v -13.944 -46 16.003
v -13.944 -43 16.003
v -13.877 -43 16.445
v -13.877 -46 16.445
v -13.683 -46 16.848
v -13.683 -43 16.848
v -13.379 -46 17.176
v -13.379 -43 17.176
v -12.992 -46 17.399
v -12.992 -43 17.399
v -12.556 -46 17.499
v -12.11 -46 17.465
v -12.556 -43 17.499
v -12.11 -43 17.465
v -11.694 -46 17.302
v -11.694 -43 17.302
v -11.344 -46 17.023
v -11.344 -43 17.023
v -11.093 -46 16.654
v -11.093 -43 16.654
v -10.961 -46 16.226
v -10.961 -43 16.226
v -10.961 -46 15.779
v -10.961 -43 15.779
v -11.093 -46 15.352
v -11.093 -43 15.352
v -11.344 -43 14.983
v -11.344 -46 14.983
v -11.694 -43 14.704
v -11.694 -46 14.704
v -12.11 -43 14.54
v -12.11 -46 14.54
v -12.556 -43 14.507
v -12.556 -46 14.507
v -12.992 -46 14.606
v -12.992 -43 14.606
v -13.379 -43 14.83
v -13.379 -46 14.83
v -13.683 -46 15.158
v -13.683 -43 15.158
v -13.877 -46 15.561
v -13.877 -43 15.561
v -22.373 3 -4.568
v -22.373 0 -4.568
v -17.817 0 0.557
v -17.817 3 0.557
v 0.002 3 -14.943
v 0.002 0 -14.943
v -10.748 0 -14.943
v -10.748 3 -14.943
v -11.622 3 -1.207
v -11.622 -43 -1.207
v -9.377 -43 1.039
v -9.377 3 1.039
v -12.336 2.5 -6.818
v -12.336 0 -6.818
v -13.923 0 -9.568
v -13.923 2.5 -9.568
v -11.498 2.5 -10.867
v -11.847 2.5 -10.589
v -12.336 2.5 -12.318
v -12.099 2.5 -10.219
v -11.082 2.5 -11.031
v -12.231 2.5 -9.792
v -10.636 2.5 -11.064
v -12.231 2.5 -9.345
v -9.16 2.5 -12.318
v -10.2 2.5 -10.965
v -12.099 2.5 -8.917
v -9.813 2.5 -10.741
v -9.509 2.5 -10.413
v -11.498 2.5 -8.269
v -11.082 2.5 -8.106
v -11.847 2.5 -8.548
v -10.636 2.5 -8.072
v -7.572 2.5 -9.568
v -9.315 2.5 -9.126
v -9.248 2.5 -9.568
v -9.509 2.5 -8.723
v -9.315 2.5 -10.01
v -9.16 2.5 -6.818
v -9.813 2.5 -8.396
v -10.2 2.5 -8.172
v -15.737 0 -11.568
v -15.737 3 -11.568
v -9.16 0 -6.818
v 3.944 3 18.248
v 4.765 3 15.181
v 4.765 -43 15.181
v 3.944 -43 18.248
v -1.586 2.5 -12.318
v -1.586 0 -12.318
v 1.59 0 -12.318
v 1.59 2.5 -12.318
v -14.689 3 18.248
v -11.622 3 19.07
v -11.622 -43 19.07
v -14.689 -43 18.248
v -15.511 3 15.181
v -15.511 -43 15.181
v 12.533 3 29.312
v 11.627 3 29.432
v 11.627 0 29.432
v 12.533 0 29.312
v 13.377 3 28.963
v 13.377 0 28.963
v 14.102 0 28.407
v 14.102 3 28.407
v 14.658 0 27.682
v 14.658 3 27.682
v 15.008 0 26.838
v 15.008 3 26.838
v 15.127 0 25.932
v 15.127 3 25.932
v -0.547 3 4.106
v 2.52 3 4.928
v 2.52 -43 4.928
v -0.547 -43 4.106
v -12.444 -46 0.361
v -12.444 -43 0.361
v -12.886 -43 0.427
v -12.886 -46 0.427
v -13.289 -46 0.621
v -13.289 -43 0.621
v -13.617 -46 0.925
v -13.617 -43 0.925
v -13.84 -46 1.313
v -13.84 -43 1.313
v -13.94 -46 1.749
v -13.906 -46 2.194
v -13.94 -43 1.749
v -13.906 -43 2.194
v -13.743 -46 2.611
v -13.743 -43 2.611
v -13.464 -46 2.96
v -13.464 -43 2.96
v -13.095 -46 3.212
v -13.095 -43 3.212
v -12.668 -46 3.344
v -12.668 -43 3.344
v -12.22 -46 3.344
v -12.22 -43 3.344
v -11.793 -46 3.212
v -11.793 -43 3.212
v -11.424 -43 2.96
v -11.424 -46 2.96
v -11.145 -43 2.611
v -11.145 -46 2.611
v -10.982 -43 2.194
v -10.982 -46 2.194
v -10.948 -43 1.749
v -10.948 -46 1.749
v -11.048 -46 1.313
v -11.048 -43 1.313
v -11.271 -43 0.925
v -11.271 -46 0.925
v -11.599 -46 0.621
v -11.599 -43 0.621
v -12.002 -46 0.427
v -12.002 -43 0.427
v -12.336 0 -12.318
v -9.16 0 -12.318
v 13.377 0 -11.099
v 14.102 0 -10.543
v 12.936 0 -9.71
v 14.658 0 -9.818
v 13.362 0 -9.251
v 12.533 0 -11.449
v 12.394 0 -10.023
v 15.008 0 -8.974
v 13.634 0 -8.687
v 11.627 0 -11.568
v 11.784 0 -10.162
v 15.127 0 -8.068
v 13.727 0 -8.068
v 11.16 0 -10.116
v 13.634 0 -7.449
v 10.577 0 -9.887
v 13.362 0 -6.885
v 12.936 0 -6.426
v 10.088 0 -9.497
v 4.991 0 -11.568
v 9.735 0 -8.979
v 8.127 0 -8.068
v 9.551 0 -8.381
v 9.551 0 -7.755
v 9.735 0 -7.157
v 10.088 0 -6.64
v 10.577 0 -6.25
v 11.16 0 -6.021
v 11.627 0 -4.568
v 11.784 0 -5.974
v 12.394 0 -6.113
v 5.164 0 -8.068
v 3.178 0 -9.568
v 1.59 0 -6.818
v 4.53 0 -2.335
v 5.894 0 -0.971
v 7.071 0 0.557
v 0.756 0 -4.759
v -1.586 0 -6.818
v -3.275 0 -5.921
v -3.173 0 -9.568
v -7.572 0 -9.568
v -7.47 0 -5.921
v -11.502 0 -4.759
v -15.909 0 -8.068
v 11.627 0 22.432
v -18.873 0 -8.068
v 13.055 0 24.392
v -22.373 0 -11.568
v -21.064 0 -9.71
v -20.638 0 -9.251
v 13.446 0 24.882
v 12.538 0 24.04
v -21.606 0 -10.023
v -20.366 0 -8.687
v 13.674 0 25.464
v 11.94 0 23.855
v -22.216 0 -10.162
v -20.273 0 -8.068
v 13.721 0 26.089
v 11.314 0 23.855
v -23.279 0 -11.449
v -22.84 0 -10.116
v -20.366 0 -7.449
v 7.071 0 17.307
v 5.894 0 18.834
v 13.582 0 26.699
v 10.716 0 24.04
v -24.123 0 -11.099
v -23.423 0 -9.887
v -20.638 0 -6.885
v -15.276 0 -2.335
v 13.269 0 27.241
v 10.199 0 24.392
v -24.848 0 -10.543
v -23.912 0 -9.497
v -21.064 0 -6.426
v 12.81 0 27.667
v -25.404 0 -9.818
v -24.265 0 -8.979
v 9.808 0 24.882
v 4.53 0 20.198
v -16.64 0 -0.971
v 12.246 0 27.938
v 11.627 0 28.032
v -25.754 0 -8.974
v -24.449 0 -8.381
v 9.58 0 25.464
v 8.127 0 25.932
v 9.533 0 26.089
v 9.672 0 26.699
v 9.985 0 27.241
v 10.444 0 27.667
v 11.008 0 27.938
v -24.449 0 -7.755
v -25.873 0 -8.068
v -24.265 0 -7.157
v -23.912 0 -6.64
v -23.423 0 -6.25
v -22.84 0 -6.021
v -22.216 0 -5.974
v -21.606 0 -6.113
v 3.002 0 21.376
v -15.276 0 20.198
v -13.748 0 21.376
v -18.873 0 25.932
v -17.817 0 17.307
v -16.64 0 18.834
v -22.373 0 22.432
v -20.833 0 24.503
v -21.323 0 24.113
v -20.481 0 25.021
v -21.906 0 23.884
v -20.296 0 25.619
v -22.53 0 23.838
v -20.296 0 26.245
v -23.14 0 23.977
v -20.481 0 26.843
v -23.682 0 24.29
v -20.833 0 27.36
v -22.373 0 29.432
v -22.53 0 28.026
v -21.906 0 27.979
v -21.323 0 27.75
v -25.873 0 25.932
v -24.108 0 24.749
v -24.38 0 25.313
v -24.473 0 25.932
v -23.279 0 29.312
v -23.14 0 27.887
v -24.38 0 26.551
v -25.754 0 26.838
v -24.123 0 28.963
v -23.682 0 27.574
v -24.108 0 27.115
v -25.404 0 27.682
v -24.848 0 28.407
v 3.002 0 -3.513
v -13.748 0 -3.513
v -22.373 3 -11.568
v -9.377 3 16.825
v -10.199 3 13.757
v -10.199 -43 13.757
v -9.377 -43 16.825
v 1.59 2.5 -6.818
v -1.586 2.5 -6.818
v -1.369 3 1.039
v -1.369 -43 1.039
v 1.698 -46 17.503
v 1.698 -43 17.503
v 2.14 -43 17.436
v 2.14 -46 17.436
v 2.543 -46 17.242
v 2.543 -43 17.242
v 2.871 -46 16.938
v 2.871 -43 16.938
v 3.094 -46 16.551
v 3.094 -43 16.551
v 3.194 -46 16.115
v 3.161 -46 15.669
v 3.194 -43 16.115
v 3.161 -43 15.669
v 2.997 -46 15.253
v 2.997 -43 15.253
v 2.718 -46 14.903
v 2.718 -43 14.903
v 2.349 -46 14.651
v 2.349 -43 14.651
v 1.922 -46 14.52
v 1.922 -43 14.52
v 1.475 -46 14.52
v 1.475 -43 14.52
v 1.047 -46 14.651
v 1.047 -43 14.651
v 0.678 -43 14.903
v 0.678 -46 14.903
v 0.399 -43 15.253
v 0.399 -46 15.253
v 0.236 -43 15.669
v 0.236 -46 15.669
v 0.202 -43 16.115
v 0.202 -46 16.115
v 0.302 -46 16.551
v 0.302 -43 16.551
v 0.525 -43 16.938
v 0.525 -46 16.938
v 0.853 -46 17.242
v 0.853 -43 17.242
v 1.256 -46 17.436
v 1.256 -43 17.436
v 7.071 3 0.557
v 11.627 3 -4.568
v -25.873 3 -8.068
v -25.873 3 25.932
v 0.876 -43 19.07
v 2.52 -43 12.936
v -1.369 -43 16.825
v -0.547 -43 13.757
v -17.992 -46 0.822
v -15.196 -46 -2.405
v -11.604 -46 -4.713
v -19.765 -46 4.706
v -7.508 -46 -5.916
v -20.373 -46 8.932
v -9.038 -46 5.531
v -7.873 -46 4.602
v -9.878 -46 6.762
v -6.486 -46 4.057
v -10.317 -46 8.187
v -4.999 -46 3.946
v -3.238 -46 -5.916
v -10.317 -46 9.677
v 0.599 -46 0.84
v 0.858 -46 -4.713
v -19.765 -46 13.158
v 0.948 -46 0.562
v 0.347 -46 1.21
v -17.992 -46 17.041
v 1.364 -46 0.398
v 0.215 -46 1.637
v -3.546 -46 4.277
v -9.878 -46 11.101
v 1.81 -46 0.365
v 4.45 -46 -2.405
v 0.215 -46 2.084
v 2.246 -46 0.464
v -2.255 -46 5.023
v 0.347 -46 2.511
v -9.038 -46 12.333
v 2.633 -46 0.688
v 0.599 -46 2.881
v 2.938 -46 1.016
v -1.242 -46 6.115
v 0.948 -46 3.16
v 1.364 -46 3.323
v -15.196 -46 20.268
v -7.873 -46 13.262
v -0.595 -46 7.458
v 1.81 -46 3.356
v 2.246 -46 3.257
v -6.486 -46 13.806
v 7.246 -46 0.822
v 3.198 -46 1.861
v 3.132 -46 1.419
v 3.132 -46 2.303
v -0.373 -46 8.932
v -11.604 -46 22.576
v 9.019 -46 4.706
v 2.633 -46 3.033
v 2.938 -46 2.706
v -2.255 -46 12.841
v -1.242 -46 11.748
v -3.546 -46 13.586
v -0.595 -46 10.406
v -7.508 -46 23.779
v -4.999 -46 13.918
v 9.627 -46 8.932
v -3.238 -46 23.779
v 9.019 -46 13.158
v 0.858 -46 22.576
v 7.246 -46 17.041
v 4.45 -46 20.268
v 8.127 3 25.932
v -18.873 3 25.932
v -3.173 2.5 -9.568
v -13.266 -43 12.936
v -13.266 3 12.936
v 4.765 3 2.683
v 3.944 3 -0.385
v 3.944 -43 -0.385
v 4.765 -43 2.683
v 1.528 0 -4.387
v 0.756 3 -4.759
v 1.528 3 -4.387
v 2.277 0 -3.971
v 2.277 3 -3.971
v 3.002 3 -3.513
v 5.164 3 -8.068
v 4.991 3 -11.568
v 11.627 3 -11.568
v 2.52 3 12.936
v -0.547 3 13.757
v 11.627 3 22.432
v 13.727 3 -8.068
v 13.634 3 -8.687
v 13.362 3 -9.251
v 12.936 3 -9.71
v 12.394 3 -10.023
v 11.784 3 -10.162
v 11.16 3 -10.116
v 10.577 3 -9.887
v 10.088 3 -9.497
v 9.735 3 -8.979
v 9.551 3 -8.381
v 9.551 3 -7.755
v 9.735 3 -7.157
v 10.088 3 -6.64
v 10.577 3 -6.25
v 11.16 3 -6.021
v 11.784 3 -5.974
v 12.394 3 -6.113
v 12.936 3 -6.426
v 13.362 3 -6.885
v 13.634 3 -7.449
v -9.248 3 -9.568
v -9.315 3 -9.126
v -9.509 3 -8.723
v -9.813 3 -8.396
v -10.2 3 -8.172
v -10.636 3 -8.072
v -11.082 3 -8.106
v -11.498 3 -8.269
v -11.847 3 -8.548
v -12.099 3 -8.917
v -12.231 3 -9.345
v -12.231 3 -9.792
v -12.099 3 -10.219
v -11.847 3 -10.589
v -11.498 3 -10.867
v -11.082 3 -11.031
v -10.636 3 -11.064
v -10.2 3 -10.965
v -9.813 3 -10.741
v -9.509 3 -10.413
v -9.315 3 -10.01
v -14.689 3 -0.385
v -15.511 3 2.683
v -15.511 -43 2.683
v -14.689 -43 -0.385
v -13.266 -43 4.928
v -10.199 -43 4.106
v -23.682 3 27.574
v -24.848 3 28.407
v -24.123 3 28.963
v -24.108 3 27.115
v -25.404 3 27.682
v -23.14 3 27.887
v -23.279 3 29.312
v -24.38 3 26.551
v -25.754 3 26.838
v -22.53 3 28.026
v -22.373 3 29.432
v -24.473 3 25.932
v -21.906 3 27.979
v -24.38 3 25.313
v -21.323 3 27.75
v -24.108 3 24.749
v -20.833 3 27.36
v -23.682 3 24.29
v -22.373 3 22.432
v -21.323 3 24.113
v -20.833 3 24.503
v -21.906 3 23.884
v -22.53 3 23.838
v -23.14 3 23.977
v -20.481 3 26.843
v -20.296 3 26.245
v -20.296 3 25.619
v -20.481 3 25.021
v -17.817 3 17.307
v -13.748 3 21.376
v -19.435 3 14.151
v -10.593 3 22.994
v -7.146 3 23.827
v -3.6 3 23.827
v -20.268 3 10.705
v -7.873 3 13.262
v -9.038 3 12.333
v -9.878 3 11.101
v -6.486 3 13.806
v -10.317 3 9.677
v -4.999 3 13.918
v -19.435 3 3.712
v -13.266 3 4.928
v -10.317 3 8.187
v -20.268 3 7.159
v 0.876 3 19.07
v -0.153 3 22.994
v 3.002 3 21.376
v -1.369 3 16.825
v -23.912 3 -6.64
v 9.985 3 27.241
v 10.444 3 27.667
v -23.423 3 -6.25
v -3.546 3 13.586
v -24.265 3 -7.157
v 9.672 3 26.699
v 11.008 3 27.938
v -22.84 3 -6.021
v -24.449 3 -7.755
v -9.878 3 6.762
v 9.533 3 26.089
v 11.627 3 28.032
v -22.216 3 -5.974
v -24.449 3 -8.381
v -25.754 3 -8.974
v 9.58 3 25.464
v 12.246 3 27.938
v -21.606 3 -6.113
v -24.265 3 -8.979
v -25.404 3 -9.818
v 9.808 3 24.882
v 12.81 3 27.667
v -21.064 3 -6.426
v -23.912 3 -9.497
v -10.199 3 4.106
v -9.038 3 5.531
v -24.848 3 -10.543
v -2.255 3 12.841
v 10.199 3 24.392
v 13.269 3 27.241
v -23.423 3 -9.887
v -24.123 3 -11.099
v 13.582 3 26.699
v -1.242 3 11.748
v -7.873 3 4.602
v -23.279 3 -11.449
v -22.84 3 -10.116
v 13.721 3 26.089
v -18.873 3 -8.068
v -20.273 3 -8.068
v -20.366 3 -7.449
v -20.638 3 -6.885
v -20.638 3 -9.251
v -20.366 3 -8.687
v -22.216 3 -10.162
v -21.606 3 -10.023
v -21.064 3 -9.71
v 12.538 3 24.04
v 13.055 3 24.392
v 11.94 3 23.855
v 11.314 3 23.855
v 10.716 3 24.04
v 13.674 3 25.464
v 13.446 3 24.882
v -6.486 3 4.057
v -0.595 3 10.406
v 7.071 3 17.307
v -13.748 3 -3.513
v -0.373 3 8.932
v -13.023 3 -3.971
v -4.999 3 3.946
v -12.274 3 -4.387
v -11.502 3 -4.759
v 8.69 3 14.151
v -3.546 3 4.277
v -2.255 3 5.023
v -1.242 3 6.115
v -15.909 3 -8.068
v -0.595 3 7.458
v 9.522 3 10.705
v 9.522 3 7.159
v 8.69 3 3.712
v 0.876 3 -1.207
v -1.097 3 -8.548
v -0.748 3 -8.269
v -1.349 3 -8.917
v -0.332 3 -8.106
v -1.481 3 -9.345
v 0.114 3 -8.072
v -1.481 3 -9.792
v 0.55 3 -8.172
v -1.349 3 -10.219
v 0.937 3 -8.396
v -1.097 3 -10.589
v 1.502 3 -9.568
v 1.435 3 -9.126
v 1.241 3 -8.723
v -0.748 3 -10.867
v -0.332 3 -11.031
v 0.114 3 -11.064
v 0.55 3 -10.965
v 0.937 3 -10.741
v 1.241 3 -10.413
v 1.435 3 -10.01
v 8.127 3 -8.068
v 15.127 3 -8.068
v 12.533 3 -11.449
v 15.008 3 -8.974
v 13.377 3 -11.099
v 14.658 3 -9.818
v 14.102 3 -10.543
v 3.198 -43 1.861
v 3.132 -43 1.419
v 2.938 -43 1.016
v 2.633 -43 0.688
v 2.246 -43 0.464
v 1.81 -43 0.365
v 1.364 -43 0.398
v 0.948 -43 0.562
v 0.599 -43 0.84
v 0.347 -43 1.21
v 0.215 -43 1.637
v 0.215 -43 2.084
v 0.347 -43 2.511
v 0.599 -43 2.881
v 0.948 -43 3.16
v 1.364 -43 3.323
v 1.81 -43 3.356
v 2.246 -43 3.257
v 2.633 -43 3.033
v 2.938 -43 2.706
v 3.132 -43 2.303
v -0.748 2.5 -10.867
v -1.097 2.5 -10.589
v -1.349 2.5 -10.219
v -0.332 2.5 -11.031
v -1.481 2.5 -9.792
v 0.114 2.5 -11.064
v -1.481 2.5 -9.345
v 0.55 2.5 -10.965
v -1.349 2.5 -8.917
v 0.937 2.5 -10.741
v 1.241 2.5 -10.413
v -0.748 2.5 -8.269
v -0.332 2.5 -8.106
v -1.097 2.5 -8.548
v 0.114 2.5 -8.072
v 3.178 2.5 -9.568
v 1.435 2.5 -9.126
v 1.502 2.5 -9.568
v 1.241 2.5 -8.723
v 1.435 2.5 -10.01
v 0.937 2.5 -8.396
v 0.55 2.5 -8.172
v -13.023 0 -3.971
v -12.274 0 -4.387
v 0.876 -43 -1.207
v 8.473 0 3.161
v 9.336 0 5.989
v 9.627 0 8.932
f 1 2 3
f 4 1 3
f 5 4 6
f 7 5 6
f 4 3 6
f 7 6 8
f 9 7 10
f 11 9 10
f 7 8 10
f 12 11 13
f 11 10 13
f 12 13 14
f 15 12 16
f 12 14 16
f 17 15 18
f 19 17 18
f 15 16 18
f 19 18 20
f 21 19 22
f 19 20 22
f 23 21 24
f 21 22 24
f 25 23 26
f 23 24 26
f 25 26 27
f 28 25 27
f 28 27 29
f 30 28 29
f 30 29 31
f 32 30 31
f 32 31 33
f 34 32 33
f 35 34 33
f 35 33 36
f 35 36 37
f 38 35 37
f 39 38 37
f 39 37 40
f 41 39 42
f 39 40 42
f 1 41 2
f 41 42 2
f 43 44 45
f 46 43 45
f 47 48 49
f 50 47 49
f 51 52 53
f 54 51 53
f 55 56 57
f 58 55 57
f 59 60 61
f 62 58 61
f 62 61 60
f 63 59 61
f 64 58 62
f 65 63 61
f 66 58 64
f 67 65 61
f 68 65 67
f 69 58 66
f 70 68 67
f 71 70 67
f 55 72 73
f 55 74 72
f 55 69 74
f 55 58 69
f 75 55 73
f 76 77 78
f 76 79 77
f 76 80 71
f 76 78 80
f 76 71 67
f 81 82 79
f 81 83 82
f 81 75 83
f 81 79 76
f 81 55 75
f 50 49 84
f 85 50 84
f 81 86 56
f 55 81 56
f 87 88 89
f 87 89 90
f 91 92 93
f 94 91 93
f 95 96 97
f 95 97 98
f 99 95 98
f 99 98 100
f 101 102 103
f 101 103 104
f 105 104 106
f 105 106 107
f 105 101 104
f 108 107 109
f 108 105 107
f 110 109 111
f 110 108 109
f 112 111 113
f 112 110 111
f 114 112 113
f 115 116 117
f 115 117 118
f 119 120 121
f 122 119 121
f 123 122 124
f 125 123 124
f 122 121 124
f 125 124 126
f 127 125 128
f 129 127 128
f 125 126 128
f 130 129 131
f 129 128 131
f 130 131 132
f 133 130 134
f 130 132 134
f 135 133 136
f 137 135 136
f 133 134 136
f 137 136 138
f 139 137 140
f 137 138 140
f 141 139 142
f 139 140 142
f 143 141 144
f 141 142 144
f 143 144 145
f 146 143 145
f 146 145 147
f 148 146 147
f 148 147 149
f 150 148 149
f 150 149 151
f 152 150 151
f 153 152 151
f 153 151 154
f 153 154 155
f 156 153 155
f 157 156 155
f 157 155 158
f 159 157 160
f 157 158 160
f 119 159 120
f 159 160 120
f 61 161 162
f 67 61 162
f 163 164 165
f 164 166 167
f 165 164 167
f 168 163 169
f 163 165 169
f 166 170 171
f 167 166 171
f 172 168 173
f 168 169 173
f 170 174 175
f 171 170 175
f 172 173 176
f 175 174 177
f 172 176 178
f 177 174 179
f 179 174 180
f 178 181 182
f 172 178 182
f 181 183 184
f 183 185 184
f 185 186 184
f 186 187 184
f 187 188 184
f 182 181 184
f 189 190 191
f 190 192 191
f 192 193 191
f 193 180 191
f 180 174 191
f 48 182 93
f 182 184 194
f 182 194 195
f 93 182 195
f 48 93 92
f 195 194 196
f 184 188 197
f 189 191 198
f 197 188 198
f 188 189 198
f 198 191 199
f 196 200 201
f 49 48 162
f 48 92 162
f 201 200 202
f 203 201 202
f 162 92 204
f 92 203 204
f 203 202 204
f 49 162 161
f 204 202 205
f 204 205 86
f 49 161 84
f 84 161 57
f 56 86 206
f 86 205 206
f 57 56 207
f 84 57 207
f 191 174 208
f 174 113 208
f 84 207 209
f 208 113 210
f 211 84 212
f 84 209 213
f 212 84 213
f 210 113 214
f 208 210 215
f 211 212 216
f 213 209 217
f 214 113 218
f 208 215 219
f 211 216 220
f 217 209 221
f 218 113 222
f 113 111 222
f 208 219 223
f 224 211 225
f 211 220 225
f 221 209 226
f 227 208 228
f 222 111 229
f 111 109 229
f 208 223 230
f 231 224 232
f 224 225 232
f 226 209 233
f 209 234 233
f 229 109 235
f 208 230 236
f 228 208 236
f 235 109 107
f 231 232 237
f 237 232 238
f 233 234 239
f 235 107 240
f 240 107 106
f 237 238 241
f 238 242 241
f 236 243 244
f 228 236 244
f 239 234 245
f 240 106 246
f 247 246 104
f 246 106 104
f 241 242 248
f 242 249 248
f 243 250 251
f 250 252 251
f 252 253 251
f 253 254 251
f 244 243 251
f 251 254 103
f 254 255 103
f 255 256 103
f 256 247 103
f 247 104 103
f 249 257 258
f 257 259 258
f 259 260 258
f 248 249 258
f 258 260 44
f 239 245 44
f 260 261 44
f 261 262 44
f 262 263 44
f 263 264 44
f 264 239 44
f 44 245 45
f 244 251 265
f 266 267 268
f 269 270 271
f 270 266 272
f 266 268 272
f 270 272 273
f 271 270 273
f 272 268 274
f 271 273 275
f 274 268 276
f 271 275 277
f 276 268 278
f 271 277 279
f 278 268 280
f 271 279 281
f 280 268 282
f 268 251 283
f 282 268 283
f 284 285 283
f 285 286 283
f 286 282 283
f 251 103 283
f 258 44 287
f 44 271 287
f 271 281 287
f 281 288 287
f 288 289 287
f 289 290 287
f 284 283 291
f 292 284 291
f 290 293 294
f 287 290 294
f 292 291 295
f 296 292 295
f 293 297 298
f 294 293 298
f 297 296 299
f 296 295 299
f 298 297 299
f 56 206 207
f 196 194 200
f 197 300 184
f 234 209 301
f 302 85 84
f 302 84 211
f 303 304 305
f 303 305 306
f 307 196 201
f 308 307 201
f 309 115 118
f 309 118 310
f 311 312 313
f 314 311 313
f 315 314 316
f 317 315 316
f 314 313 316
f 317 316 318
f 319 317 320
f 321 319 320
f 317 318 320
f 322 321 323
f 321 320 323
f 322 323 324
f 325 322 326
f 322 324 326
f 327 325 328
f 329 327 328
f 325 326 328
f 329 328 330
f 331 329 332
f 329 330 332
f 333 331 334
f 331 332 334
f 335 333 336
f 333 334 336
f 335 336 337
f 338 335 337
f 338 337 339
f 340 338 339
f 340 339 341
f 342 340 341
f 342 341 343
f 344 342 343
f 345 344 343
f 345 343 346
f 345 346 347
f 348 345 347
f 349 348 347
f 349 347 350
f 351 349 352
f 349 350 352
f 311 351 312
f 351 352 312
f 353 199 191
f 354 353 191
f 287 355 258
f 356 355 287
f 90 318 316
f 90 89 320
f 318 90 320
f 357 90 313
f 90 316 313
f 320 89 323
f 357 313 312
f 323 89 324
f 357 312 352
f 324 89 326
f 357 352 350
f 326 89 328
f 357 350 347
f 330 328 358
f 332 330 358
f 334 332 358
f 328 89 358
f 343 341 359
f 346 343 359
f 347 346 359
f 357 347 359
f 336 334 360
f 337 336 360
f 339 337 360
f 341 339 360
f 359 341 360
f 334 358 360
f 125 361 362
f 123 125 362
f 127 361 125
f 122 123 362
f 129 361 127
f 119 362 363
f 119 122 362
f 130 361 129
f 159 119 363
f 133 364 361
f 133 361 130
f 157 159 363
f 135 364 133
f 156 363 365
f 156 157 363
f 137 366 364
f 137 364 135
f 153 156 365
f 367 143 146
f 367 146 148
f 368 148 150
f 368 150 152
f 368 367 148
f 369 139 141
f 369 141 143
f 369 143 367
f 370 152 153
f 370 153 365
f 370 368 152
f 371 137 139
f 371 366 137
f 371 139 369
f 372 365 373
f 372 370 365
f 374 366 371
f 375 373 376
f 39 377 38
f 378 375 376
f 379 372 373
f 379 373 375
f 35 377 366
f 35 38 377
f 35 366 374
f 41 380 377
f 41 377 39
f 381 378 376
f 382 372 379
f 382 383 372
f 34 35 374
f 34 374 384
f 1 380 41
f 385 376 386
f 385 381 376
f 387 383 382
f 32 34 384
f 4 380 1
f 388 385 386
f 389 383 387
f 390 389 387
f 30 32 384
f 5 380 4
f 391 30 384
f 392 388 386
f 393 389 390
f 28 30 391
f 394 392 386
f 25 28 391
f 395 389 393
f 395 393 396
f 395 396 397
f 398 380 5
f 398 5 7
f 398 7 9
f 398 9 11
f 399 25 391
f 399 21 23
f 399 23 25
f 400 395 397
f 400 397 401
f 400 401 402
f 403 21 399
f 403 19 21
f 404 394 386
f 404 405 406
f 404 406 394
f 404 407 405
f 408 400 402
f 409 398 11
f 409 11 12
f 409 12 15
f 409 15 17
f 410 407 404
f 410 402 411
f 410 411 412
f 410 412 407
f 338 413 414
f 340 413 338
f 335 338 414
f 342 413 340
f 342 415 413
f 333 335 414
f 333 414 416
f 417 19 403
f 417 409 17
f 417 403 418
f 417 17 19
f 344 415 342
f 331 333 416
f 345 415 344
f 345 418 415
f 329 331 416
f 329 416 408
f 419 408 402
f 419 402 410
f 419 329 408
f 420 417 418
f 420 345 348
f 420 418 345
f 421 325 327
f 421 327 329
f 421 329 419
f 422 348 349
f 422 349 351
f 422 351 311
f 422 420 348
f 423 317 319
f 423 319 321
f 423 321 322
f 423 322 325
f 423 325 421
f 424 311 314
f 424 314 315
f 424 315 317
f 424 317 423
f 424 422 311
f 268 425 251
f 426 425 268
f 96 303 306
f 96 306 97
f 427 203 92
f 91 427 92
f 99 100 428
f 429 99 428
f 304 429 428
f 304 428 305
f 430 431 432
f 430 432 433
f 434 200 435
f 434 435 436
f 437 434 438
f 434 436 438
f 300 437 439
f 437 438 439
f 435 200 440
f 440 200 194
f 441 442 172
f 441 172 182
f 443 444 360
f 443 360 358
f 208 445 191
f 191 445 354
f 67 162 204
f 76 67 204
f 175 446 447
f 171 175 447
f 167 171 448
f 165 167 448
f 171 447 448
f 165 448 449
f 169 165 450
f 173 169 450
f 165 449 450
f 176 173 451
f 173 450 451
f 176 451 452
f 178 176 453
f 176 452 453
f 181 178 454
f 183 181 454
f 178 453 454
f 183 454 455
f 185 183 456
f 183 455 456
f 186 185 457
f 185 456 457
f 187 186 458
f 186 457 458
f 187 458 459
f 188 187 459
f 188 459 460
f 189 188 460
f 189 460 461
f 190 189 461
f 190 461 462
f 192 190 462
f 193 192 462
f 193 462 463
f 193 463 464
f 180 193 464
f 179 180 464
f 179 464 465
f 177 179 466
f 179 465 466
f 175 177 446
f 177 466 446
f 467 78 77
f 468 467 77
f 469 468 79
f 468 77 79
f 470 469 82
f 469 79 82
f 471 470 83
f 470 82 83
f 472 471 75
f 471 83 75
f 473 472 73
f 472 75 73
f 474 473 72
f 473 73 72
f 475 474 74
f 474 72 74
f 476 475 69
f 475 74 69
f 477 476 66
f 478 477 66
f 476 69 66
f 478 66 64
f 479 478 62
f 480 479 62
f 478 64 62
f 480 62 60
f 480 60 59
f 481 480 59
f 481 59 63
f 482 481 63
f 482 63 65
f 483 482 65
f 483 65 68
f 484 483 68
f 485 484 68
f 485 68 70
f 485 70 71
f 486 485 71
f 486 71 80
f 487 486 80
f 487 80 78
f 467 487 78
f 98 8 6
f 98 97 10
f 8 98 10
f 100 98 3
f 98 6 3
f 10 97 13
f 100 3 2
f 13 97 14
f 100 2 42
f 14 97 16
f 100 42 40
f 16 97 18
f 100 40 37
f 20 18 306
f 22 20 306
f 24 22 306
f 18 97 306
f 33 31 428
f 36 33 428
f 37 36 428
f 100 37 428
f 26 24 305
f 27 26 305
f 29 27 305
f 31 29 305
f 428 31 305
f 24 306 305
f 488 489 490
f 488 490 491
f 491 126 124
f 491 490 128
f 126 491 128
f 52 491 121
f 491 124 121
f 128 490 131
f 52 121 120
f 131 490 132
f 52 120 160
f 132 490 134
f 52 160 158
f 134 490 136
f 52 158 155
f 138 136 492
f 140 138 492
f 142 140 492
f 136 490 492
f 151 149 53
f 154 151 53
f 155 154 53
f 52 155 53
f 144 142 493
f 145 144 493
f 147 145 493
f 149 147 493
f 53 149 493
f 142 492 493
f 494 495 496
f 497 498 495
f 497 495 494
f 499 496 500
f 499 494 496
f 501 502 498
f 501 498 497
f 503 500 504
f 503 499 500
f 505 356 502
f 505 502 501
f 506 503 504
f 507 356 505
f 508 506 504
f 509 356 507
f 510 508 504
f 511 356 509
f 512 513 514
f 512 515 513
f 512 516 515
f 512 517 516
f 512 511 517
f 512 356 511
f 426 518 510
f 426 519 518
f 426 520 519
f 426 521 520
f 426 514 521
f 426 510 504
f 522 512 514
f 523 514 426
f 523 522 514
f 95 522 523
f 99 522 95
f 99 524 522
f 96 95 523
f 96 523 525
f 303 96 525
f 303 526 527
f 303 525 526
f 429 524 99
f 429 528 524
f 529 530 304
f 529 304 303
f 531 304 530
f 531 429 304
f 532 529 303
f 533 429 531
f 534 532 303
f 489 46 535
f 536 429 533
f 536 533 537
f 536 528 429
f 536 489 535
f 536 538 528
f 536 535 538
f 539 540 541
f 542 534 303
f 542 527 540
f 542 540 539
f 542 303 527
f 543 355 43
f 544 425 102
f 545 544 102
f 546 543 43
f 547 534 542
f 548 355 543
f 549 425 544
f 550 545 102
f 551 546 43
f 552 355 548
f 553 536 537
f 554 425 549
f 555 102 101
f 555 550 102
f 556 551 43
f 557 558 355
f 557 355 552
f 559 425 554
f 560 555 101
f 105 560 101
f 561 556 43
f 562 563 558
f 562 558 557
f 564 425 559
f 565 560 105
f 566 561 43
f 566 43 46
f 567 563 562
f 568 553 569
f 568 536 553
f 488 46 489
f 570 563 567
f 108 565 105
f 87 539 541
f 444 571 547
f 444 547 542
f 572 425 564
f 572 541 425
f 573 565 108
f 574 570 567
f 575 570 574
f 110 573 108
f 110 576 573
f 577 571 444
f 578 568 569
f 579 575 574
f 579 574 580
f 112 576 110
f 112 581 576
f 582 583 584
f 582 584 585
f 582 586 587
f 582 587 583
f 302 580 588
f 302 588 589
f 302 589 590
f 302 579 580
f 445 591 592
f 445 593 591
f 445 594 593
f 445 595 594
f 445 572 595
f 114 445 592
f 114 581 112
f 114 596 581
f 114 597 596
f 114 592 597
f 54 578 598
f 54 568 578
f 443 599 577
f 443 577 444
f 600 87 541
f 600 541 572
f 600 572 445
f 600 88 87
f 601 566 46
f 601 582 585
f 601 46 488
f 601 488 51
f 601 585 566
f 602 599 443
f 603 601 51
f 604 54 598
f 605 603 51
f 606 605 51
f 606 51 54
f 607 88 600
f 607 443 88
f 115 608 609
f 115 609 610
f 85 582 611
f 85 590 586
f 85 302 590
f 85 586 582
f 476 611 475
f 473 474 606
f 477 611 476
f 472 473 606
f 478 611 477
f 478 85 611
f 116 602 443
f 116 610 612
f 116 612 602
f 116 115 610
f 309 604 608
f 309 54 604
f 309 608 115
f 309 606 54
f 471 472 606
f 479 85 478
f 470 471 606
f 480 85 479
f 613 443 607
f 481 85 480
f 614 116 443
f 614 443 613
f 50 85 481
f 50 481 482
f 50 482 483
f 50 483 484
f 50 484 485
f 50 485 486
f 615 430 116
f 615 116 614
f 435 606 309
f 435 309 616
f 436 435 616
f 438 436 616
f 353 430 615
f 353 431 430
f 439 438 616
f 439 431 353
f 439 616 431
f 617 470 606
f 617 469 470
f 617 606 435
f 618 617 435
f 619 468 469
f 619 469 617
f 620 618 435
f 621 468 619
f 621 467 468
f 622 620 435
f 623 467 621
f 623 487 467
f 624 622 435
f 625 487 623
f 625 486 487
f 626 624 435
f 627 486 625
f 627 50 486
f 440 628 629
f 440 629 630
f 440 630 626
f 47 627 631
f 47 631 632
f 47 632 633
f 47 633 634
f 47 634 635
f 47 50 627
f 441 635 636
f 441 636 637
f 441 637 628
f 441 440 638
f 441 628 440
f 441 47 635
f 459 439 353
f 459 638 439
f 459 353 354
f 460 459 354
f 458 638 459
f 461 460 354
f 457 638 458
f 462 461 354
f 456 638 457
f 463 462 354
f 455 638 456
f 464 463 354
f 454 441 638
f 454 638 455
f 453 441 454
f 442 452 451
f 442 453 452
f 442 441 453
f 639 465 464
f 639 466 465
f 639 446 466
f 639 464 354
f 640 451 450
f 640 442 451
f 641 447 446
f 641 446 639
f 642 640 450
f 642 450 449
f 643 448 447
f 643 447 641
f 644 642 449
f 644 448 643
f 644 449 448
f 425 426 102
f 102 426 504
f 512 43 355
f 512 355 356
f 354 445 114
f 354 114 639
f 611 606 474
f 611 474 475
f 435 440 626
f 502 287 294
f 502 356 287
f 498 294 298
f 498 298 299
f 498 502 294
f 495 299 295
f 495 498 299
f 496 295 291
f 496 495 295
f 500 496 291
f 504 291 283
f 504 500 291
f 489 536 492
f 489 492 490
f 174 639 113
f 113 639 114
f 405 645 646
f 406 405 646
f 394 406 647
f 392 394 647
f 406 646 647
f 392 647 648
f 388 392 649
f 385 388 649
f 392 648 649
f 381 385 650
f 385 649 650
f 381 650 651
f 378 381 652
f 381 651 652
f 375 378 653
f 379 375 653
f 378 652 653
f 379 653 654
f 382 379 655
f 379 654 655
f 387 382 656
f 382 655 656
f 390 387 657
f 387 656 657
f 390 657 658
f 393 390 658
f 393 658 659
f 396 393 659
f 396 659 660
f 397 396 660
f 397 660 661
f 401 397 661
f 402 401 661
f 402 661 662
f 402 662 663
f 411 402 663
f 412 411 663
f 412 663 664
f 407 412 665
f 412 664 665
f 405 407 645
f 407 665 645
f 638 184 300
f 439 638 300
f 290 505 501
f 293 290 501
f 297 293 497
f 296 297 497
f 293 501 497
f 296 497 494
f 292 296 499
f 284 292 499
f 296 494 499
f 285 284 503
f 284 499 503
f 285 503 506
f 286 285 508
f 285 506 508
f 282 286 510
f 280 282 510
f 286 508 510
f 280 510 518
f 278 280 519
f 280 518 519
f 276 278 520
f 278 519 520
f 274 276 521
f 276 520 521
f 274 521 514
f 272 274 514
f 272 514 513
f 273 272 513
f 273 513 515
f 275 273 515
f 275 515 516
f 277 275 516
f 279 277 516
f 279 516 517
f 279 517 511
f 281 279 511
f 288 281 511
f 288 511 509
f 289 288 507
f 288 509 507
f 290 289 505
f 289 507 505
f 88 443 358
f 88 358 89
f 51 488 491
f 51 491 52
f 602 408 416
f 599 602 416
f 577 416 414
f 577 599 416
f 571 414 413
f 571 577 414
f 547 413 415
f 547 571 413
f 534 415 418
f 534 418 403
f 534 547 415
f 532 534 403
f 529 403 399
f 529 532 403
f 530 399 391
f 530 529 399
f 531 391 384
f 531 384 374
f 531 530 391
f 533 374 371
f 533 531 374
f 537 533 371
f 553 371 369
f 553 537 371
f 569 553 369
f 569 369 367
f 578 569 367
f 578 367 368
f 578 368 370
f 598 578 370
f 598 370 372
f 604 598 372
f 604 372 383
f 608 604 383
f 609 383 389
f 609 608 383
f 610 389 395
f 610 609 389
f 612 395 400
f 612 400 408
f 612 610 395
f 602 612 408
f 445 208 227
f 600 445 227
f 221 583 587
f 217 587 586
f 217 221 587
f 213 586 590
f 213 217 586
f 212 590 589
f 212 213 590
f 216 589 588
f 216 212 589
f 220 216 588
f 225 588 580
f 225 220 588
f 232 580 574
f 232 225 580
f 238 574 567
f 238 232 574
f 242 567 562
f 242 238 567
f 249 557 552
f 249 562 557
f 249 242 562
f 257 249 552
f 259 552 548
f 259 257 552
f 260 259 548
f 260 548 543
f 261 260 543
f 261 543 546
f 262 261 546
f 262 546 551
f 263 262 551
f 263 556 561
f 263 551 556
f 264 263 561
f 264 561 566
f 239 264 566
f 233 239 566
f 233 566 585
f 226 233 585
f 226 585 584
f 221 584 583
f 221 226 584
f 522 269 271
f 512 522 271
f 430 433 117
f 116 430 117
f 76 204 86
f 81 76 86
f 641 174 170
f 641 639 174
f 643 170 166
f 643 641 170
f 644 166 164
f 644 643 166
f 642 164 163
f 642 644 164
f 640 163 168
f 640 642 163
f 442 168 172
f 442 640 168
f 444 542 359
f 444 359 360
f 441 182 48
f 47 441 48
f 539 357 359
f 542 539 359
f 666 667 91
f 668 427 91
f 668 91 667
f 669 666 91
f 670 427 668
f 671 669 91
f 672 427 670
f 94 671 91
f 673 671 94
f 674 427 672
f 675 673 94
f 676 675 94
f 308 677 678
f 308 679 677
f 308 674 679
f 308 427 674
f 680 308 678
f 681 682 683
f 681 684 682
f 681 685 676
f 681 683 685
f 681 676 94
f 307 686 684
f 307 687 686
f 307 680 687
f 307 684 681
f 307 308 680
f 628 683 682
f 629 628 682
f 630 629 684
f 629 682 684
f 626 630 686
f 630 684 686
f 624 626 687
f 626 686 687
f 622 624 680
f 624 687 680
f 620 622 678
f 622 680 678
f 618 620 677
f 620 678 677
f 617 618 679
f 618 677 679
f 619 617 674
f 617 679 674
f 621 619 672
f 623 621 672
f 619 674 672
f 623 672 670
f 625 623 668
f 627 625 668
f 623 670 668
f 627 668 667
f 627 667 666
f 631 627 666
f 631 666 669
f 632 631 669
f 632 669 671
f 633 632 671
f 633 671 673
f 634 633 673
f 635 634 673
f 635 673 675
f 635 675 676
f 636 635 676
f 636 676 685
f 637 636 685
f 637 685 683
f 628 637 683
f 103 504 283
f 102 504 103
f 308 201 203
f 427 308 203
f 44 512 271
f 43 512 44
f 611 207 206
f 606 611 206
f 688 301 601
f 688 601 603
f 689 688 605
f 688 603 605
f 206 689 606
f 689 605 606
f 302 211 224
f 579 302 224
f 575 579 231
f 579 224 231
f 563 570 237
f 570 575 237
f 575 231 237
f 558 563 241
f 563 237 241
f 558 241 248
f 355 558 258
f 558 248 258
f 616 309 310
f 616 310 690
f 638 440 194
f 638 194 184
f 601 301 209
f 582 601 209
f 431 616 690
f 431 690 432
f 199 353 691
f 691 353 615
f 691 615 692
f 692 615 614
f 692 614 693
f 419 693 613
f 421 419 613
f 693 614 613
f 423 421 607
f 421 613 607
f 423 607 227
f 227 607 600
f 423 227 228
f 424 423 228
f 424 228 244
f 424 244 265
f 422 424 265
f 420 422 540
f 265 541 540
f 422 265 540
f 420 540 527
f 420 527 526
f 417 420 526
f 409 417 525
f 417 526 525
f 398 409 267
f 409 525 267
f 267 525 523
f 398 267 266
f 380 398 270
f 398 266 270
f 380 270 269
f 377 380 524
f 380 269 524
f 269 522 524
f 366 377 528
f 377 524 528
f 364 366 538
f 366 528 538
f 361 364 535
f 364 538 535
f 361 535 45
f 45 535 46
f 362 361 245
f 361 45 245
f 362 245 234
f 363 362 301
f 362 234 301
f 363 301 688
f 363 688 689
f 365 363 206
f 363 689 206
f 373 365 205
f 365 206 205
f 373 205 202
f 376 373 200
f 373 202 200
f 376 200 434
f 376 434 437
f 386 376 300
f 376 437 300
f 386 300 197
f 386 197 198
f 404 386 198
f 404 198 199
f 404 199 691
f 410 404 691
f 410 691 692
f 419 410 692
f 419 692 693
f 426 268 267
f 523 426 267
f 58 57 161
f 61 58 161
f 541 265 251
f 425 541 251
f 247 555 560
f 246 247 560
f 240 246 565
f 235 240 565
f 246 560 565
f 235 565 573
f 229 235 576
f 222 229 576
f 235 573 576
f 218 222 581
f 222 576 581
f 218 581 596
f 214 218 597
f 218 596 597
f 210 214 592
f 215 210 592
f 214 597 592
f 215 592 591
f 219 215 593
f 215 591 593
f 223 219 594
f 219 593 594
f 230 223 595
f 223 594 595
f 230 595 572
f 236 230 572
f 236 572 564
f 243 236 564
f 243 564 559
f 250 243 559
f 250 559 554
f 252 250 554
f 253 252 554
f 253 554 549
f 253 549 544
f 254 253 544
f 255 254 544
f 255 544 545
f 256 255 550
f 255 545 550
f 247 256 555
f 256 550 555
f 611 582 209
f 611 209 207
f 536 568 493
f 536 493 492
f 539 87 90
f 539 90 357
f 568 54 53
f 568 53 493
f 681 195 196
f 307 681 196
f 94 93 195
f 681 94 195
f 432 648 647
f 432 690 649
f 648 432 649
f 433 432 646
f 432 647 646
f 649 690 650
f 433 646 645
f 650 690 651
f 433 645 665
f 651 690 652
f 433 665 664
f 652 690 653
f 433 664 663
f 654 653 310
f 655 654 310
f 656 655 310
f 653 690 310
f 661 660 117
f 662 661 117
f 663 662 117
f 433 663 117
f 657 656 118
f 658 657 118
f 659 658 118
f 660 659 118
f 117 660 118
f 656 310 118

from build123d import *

# Parameters (mm, degrees)
SKETCH_1_R               = 15
SKETCH_1_R_2             = 5
EXTRUDE_4_DEPTH          = 3
SKETCH_1_R_3             = 3.5
SKETCH_1_R_4             = 2.1
EXTRUDE_4_2_DEPTH        = 3
EXTRUDE_5_DEPTH          = 3
PATTERN_CIRCULAR_2_COUNT = 4
SKETCH_6_R               = 3.5
SKETCH_6_R_2             = 2.1
EXTRUDE_6_DEPTH          = 3
PATTERN_CIRCULAR_3_COUNT = 4
SKETCH_7_R               = 15
SKETCH_7_R_2             = 5
EXTRUDE_7_DEPTH          = 46
CUT_EXTRUDE_1_DEPTH      = 46
PATTERN_CIRCULAR_4_COUNT = 4
SKETCH_11_R              = 1.5
CUT_EXTRUDE_2_DEPTH      = 3
PATTERN_CIRCULAR_5_COUNT = 4
EXTRUDE_8_DEPTH          = 3
EXTRUDE_9_DEPTH          = 3
EXTRUDE_10_DEPTH         = 3
EXTRUDE_11_DEPTH         = 3
EXTRUDE_13_DEPTH         = 3
EXTRUDE_14_DEPTH         = 3
CUT_EXTRUDE_3_DEPTH      = 2.5
SKETCH_19_R              = 1.5
CUT_EXTRUDE_4_DEPTH      = 2.5
SKETCH_20_R              = 1.5
CUT_EXTRUDE_5_DEPTH      = 2.5
SKETCH_21_R              = 15
SKETCH_21_R_2            = 5
EXTRUDE_15_DEPTH         = 3
SKETCH_22_R              = 1.5
CUT_EXTRUDE_6_DEPTH      = 3
PATTERN_CIRCULAR_6_COUNT = 4
EXTRUDE_16_DEPTH         = 3
CUT_EXTRUDE_7_DEPTH      = 3
SKETCH_25_R              = 15
SKETCH_25_R_2            = 5
EXTRUDE_17_DEPTH         = 43
SKETCH_27_R              = 1.5
CUT_EXTRUDE_8_DEPTH      = 46
SKETCH_28_R              = 2.75
CUT_EXTRUDE_9_DEPTH      = 43
SKETCH_29_R              = 1.5
CUT_EXTRUDE_10_DEPTH     = 46
PATTERN_CIRCULAR_7_COUNT = 4
CUT_EXTRUDE_11_DEPTH     = 43
PATTERN_CIRCULAR_8_COUNT = 4
SKETCH_31_R              = 26.244176336
CUT_EXTRUDE_12_DEPTH     = 100


with BuildPart() as part:
    # 草图1 → 凸台-拉伸4 (new body)
    with BuildSketch(Plane(origin=(0, 0, 0), x_dir=(1, 0, 0), z_dir=(0, 1, 0))):
        with Locations((-5.372895461, -8.931727747)):
            Circle(SKETCH_1_R)
        with Locations((-5.372895461, -8.931727747)):
            Circle(SKETCH_1_R_2, mode=Mode.SUBTRACT)
    extrude(amount=EXTRUDE_4_DEPTH)



with BuildPart() as body_2:
    # 草图1 → Extrude 4 2 (new body)
    with BuildSketch(Plane(origin=(0, 0, 0), x_dir=(1, 0, 0), z_dir=(0, 1, 0))):
        with Locations((-22.372895461, 8.068272253)):
            Circle(SKETCH_1_R_3)
        with Locations((-22.372895461, 8.068272253)):
            Circle(SKETCH_1_R_4, mode=Mode.SUBTRACT)
    extrude(amount=EXTRUDE_4_2_DEPTH)


with BuildPart() as part_1:
    add(part.part)

    add(body_2.part)  # 凸台-拉伸5 merges body 2
    # 草图5 → 凸台-拉伸5 (add)
    with BuildSketch(Plane(origin=(0, 0, 0), x_dir=(1, 0, 0), z_dir=(0, 1, 0))):
        Polygon((-22.372895461, 4.568272253), (-10.372895461, -8.931727747), (-10.372895461, -3.931727747), (-5.372895461, -3.931727747), (-18.872895461, 8.068272253), align=None)
    extrude_5 = extrude(amount=EXTRUDE_5_DEPTH)

    # 阵列(圆周)2: 凸台-拉伸5 ×4 about axis
    pattern_circular_2_axis = Axis((-5.372895461, 0, 8.931727747), (0, 1, 0))
    for i in range(1, PATTERN_CIRCULAR_2_COUNT):
        add(extrude_5.rotate(pattern_circular_2_axis, i * 360 / PATTERN_CIRCULAR_2_COUNT))

    # 草图6 → 凸台-拉伸6 (add)
    with BuildSketch(Plane(origin=(0, 3, 0), x_dir=(1, 0, 0), z_dir=(0, 1, 0))):
        with Locations((11.627104539, 8.068272253)):
            Circle(SKETCH_6_R)
        with Locations((11.627104539, 8.068272253)):
            Circle(SKETCH_6_R_2, mode=Mode.SUBTRACT)
    extrude_6 = extrude(amount=-EXTRUDE_6_DEPTH)

    # 阵列(圆周)3: 凸台-拉伸6 ×4 about axis
    pattern_circular_3_axis = Axis((-5.372895461, 0, 8.931727747), (0, 1, 0))
    for i in range(1, PATTERN_CIRCULAR_3_COUNT):
        add(extrude_6.rotate(pattern_circular_3_axis, i * 360 / PATTERN_CIRCULAR_3_COUNT))

    # 草图7 → 凸台-拉伸7 (add)
    with BuildSketch(Plane.XZ):
        with Locations((-5.372895461, 8.931727747)):
            Circle(SKETCH_7_R)
        with Locations((-5.372895461, 8.931727747)):
            Circle(SKETCH_7_R_2, mode=Mode.SUBTRACT)
    extrude(amount=EXTRUDE_7_DEPTH)

    # 草图9 → 切除-拉伸1 (cut)
    with BuildSketch(Plane(origin=(0, 3, 0), x_dir=(1, 0, 0), z_dir=(0, 1, 0))):
        Polygon((0.876311502, -19.070022006), (-1.369054096, -16.824656408), (-0.547193246, -13.757429961), (2.520033201, -12.935569112), (4.765398798, -15.180934709), (3.943537949, -18.248161156), align=None)
    cut_extrude_1 = extrude(amount=-CUT_EXTRUDE_1_DEPTH, mode=Mode.SUBTRACT)

    # 阵列(圆周)4: 切除-拉伸1 ×4 about axis
    pattern_circular_4_axis = Axis((-5.372895461, 0, 8.931727747), (0, 1, 0))
    for i in range(1, PATTERN_CIRCULAR_4_COUNT):
        add(cut_extrude_1.rotate(pattern_circular_4_axis, i * 360 / PATTERN_CIRCULAR_4_COUNT), mode=Mode.SUBTRACT)

    # 草图11 → 切除-拉伸2 (cut)
    with BuildSketch(Plane(origin=(0, -43, 0), x_dir=(1, 0, 0), z_dir=(0, 1, 0))):
        with Locations((1.698172351, -1.860659935)):
            Circle(SKETCH_11_R)
    cut_extrude_2 = extrude(amount=-CUT_EXTRUDE_2_DEPTH, mode=Mode.SUBTRACT)

    # 阵列(圆周)5: 切除-拉伸2 ×4 about axis
    pattern_circular_5_axis = Axis((-5.372895461, 0, 8.931727747), (0, 1, 0))
    for i in range(1, PATTERN_CIRCULAR_5_COUNT):
        add(cut_extrude_2.rotate(pattern_circular_5_axis, i * 360 / PATTERN_CIRCULAR_5_COUNT), mode=Mode.SUBTRACT)

    # 草图12 → 凸台-拉伸8 (add)
    with BuildSketch(Plane(origin=(0, 3, 0), x_dir=(1, 0, 0), z_dir=(0, 1, 0))):
        Polygon((15.127104539, 8.068272253), (15.127104539, -25.931727747), (11.627104539, -22.431727747), (11.627104539, 4.568272253), align=None)
    extrude(amount=-EXTRUDE_8_DEPTH)

    # 草图13 → 凸台-拉伸9 (add)
    with BuildSketch(Plane(origin=(0, 3, 0), x_dir=(1, 0, 0), z_dir=(0, 1, 0))):
        Polygon((11.627104539, 11.568272253), (-22.372895461, 11.568272253), (-18.872895461, 8.068272253), (8.127104539, 8.068272253), align=None)
    extrude(amount=-EXTRUDE_9_DEPTH)

    # 草图14 → 凸台-拉伸10 (add)
    with BuildSketch(Plane(origin=(0, 3, 0), x_dir=(1, 0, 0), z_dir=(0, 1, 0))):
        Polygon((-25.872895461, 8.068272253), (-25.872895461, -25.931727747), (-22.372895461, -22.431727747), (-22.372895461, 4.568272253), align=None)
    extrude(amount=-EXTRUDE_10_DEPTH)

    # 草图15 → 凸台-拉伸11 (add)
    with BuildSketch(Plane(origin=(0, 3, 0), x_dir=(1, 0, 0), z_dir=(0, 1, 0))):
        Polygon((-22.372895461, -29.431727747), (11.627104539, -29.431727747), (8.127104539, -25.931727747), (-18.872895461, -25.931727747), align=None)
    extrude(amount=-EXTRUDE_11_DEPTH)

    # 草图16 → 凸台-拉伸13 (add)
    with BuildSketch(Plane.XZ):
        Polygon((-10.747895461, -4.193272253), (0.002104539, -4.193272253), (5.163560245, -8.068272253), (4.99115505, -11.568272253), (0.002104539, -14.943272253), (-10.747895461, -14.943272253), (-15.736945971, -11.568272253), (-15.909351166, -8.068272253), align=None)
        Polygon((-7.57246898, -9.568272253), (-9.16018222, -6.818272253), (-12.335608701, -6.818272253), (-13.923321941, -9.568272253), (-12.335608701, -12.318272253), (-9.16018222, -12.318272253), align=None, mode=Mode.SUBTRACT)
        Polygon((3.17753102, -9.568272253), (1.58981778, -6.818272253), (-1.585608701, -6.818272253), (-3.173321941, -9.568272253), (-1.585608701, -12.318272253), (1.58981778, -12.318272253), align=None, mode=Mode.SUBTRACT)
    extrude(amount=-EXTRUDE_13_DEPTH)

    # 草图18 → 凸台-拉伸14 (add)
    with BuildSketch(Plane.XZ):
        Polygon((-7.57246898, -9.568272253), (-9.16018222, -6.818272253), (-12.335608701, -6.818272253), (-13.923321941, -9.568272253), (-12.335608701, -12.318272253), (-9.16018222, -12.318272253), align=None)
        Polygon((3.17753102, -9.568272253), (1.58981778, -6.818272253), (-1.585608701, -6.818272253), (-3.173321941, -9.568272253), (-1.585608701, -12.318272253), (1.58981778, -12.318272253), align=None)
    extrude(amount=-EXTRUDE_14_DEPTH)

    # 草图17 → 切除-拉伸3 (cut)
    with BuildSketch(Plane.XZ):
        Polygon((-7.57246898, -9.568272253), (-9.16018222, -6.818272253), (-12.335608701, -6.818272253), (-13.923321941, -9.568272253), (-12.335608701, -12.318272253), (-9.16018222, -12.318272253), align=None)
        Polygon((3.17753102, -9.568272253), (1.58981778, -6.818272253), (-1.585608701, -6.818272253), (-3.173321941, -9.568272253), (-1.585608701, -12.318272253), (1.58981778, -12.318272253), align=None)
    extrude(amount=-CUT_EXTRUDE_3_DEPTH, mode=Mode.SUBTRACT)

    # 草图19 → 切除-拉伸4 (cut)
    with BuildSketch(Plane.XZ.offset(-2.5)):
        with Locations((0.002104539, -9.568272253)):
            Circle(SKETCH_19_R)
    extrude(amount=-CUT_EXTRUDE_4_DEPTH, mode=Mode.SUBTRACT)

    # 草图20 → 切除-拉伸5 (cut)
    with BuildSketch(Plane.XZ.offset(-2.5)):
        with Locations((-10.747895461, -9.568272253)):
            Circle(SKETCH_20_R)
    extrude(amount=-CUT_EXTRUDE_5_DEPTH, mode=Mode.SUBTRACT)

    # 草图8 → 凸台-拉伸16 (add)
    with BuildSketch(Plane.XZ.offset(46)):
        Polygon((3.943537949, 18.248161156), (0.876311502, 19.070022006), (-1.369054096, 16.824656408), (-0.547193246, 13.757429961), (2.520033201, 12.935569112), (4.765398798, 15.180934709), align=None)
    extrude(amount=EXTRUDE_16_DEPTH)

    # 草图24 → 切除-拉伸7 (cut)
    with BuildSketch(Plane.XZ.offset(49)):
        Polygon((4.765398798, 15.180934709), (3.943537949, 18.248161156), (0.876311502, 19.070022006), (-1.369054096, 16.824656408), (-0.547193246, 13.757429961), (2.520033201, 12.935569112), align=None)
    extrude(amount=-CUT_EXTRUDE_7_DEPTH, mode=Mode.SUBTRACT)


with BuildPart() as body_2_2:
    # 草图21 → 凸台-拉伸15 (new body)
    with BuildSketch(Plane(origin=(0, 0, 0), x_dir=(1, 0, 0), z_dir=(0, 1, 0))):
        with Locations((59.665545214, -8.931727747)):
            Circle(SKETCH_21_R)
        with Locations((59.665545214, -8.931727747)):
            Circle(SKETCH_21_R_2, mode=Mode.SUBTRACT)
    extrude(amount=EXTRUDE_15_DEPTH)

    # 草图22 → 切除-拉伸6 (cut)
    with BuildSketch(Plane.XZ):
        with Locations((59.665545214, 18.931727747)):
            Circle(SKETCH_22_R)
    cut_extrude_6 = extrude(amount=-CUT_EXTRUDE_6_DEPTH, mode=Mode.SUBTRACT)

    # 阵列(圆周)6: 切除-拉伸6 ×4 about axis
    pattern_circular_6_axis = Axis((59.665545214, 0, 8.931727747), (0, 1, 0))
    for i in range(1, PATTERN_CIRCULAR_6_COUNT):
        add(cut_extrude_6.rotate(pattern_circular_6_axis, i * 360 / PATTERN_CIRCULAR_6_COUNT), mode=Mode.SUBTRACT)

    # 草图25 → 凸台-拉伸17 (add)
    with BuildSketch(Plane.XZ):
        with Locations((59.665545214, 8.931727747)):
            Circle(SKETCH_25_R)
        with Locations((59.665545214, 8.931727747)):
            Circle(SKETCH_25_R_2, mode=Mode.SUBTRACT)
    extrude(amount=EXTRUDE_17_DEPTH)

    # 草图27 → 切除-拉伸8 (cut)
    with BuildSketch(Plane(origin=(0, 3, 0), x_dir=(1, 0, 0), z_dir=(0, 1, 0))):
        with Locations((59.665545214, 1.068272253)):
            Circle(SKETCH_27_R)
        with Locations((69.665545214, -8.931727747)):
            Circle(SKETCH_27_R)
        with Locations((59.665545214, -18.931727747)):
            Circle(SKETCH_27_R)
        with Locations((49.665545214, -8.931727747)):
            Circle(SKETCH_27_R)
    extrude(amount=-CUT_EXTRUDE_8_DEPTH, mode=Mode.SUBTRACT)

    # 草图28 → 切除-拉伸9 (cut)
    with BuildSketch(Plane.XZ.offset(43)):
        with Locations((59.665545214, 18.931727747)):
            Circle(SKETCH_28_R)
        with Locations((49.665545214, 8.931727747)):
            Circle(SKETCH_28_R)
        with Locations((59.665545214, -1.068272253)):
            Circle(SKETCH_28_R)
        with Locations((69.665545214, 8.931727747)):
            Circle(SKETCH_28_R)
    extrude(amount=-CUT_EXTRUDE_9_DEPTH, mode=Mode.SUBTRACT)

    # 草图29 → 切除-拉伸10 (cut)
    with BuildSketch(Plane(origin=(0, 3, 0), x_dir=(1, 0, 0), z_dir=(0, 1, 0))):
        with Locations((66.736613026, -1.860659935)):
            Circle(SKETCH_29_R)
    cut_extrude_10 = extrude(amount=-CUT_EXTRUDE_10_DEPTH, mode=Mode.SUBTRACT)

    # 阵列(圆周)7: 切除-拉伸10 ×4 about axis
    pattern_circular_7_axis = Axis((59.665545214, 0, 8.931727747), (0, 1, 0))
    for i in range(1, PATTERN_CIRCULAR_7_COUNT):
        add(cut_extrude_10.rotate(pattern_circular_7_axis, i * 360 / PATTERN_CIRCULAR_7_COUNT), mode=Mode.SUBTRACT)

    # 草图30 → 切除-拉伸11 (cut)
    with BuildSketch(Plane(origin=(0, 3, 0), x_dir=(1, 0, 0), z_dir=(0, 1, 0))):
        Polygon((64.491247429, -4.106025533), (67.558473876, -4.927886382), (69.803839473, -2.682520785), (68.981978624, 0.384705662), (65.914752177, 1.206566512), (63.669386579, -1.038799086), align=None)
    cut_extrude_11 = extrude(amount=-CUT_EXTRUDE_11_DEPTH, mode=Mode.SUBTRACT)

    # 阵列(圆周)8: 切除-拉伸11 ×4 about axis
    pattern_circular_8_axis = Axis((59.665545214, 0, 8.931727747), (0, 1, 0))
    for i in range(1, PATTERN_CIRCULAR_8_COUNT):
        add(cut_extrude_11.rotate(pattern_circular_8_axis, i * 360 / PATTERN_CIRCULAR_8_COUNT), mode=Mode.SUBTRACT)

    # 草图31 → 切除-拉伸12 (cut)
    with BuildSketch(Plane(origin=(0, 3, 0), x_dir=(1, 0, 0), z_dir=(0, 1, 0))):
        with Locations((59.665545214, -8.931727747)):
            Circle(SKETCH_31_R)
    extrude(amount=-CUT_EXTRUDE_12_DEPTH, mode=Mode.SUBTRACT)


solid = part_1.part
